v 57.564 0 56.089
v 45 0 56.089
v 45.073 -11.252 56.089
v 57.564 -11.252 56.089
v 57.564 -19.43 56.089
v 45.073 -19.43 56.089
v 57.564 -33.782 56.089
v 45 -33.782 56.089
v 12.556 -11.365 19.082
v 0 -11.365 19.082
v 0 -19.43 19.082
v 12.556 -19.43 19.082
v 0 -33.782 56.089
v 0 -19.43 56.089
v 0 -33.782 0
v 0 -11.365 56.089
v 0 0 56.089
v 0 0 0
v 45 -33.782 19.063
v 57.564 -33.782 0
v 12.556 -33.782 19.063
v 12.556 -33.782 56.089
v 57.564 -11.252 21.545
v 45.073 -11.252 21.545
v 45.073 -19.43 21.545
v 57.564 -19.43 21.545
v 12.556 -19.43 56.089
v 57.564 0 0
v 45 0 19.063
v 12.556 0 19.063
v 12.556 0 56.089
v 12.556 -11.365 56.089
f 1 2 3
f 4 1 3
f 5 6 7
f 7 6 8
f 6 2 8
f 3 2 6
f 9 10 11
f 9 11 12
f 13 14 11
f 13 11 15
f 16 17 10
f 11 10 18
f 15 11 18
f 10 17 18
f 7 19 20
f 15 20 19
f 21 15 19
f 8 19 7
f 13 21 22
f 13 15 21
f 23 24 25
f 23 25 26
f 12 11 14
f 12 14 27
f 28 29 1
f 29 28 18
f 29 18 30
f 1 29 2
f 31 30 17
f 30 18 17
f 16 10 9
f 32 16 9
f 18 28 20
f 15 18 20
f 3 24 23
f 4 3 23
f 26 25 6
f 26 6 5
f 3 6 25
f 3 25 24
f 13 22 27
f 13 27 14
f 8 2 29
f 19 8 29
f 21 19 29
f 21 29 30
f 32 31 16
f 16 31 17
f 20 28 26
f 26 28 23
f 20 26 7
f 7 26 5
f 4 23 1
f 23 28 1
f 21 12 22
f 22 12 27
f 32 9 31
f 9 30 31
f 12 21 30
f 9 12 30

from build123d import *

# Parameters (mm, degrees)
F1_DEPTH = 33.782
F2_DEPTH = 1.016
F3_W     = 12.5559801236
F3_H     = 8.0651557073
F4_DEPTH = 37.0078
F3_W_2   = 12.5338770449
F3_H_2   = 8.1778438762
F5_DEPTH = 34.544


with BuildPart() as f1:
    # F0 (on Front) → F1 (new body)
    with BuildSketch(Plane.XZ):
        Polygon((0, 56.0894832015), (0, 0), (56.5477348864, 0), (56.5477348864, 56.0894832015), (44.99989748, 56.0894832015), (44.99989748, 19.0630927682), (12.5559801236, 19.0630927682), (12.5559801236, 56.0894832015), align=None)
    extrude(amount=F1_DEPTH)

    # F2 (add): a face of the model
    f2_faces = [f1.faces().sort_by_distance(p)[0] for p in [
        (56.5477348864, -16.891, 28.0447416008),
    ]]
    extrude(f2_faces, amount=F2_DEPTH)

    # F3 (on face) → F4 (cut)
    with BuildSketch(Plane.XY.offset(56.0894832015)):
        with Locations((6.2779900618, -15.3971132822)):
            Rectangle(F3_W, F3_H)
    extrude(amount=-F4_DEPTH, mode=Mode.SUBTRACT)

    # F3 (on face) → F5 (cut)
    with BuildSketch(Plane.XY.offset(56.0894832015)):
        with Locations((6.2779900618, -15.3971132822)):
            Rectangle(F3_W, F3_H)
        with Locations((51.3402279466, -15.3407691978)):
            Rectangle(F3_W_2, F3_H_2)
    extrude(amount=-F5_DEPTH, mode=Mode.SUBTRACT)


solid = f1.part
